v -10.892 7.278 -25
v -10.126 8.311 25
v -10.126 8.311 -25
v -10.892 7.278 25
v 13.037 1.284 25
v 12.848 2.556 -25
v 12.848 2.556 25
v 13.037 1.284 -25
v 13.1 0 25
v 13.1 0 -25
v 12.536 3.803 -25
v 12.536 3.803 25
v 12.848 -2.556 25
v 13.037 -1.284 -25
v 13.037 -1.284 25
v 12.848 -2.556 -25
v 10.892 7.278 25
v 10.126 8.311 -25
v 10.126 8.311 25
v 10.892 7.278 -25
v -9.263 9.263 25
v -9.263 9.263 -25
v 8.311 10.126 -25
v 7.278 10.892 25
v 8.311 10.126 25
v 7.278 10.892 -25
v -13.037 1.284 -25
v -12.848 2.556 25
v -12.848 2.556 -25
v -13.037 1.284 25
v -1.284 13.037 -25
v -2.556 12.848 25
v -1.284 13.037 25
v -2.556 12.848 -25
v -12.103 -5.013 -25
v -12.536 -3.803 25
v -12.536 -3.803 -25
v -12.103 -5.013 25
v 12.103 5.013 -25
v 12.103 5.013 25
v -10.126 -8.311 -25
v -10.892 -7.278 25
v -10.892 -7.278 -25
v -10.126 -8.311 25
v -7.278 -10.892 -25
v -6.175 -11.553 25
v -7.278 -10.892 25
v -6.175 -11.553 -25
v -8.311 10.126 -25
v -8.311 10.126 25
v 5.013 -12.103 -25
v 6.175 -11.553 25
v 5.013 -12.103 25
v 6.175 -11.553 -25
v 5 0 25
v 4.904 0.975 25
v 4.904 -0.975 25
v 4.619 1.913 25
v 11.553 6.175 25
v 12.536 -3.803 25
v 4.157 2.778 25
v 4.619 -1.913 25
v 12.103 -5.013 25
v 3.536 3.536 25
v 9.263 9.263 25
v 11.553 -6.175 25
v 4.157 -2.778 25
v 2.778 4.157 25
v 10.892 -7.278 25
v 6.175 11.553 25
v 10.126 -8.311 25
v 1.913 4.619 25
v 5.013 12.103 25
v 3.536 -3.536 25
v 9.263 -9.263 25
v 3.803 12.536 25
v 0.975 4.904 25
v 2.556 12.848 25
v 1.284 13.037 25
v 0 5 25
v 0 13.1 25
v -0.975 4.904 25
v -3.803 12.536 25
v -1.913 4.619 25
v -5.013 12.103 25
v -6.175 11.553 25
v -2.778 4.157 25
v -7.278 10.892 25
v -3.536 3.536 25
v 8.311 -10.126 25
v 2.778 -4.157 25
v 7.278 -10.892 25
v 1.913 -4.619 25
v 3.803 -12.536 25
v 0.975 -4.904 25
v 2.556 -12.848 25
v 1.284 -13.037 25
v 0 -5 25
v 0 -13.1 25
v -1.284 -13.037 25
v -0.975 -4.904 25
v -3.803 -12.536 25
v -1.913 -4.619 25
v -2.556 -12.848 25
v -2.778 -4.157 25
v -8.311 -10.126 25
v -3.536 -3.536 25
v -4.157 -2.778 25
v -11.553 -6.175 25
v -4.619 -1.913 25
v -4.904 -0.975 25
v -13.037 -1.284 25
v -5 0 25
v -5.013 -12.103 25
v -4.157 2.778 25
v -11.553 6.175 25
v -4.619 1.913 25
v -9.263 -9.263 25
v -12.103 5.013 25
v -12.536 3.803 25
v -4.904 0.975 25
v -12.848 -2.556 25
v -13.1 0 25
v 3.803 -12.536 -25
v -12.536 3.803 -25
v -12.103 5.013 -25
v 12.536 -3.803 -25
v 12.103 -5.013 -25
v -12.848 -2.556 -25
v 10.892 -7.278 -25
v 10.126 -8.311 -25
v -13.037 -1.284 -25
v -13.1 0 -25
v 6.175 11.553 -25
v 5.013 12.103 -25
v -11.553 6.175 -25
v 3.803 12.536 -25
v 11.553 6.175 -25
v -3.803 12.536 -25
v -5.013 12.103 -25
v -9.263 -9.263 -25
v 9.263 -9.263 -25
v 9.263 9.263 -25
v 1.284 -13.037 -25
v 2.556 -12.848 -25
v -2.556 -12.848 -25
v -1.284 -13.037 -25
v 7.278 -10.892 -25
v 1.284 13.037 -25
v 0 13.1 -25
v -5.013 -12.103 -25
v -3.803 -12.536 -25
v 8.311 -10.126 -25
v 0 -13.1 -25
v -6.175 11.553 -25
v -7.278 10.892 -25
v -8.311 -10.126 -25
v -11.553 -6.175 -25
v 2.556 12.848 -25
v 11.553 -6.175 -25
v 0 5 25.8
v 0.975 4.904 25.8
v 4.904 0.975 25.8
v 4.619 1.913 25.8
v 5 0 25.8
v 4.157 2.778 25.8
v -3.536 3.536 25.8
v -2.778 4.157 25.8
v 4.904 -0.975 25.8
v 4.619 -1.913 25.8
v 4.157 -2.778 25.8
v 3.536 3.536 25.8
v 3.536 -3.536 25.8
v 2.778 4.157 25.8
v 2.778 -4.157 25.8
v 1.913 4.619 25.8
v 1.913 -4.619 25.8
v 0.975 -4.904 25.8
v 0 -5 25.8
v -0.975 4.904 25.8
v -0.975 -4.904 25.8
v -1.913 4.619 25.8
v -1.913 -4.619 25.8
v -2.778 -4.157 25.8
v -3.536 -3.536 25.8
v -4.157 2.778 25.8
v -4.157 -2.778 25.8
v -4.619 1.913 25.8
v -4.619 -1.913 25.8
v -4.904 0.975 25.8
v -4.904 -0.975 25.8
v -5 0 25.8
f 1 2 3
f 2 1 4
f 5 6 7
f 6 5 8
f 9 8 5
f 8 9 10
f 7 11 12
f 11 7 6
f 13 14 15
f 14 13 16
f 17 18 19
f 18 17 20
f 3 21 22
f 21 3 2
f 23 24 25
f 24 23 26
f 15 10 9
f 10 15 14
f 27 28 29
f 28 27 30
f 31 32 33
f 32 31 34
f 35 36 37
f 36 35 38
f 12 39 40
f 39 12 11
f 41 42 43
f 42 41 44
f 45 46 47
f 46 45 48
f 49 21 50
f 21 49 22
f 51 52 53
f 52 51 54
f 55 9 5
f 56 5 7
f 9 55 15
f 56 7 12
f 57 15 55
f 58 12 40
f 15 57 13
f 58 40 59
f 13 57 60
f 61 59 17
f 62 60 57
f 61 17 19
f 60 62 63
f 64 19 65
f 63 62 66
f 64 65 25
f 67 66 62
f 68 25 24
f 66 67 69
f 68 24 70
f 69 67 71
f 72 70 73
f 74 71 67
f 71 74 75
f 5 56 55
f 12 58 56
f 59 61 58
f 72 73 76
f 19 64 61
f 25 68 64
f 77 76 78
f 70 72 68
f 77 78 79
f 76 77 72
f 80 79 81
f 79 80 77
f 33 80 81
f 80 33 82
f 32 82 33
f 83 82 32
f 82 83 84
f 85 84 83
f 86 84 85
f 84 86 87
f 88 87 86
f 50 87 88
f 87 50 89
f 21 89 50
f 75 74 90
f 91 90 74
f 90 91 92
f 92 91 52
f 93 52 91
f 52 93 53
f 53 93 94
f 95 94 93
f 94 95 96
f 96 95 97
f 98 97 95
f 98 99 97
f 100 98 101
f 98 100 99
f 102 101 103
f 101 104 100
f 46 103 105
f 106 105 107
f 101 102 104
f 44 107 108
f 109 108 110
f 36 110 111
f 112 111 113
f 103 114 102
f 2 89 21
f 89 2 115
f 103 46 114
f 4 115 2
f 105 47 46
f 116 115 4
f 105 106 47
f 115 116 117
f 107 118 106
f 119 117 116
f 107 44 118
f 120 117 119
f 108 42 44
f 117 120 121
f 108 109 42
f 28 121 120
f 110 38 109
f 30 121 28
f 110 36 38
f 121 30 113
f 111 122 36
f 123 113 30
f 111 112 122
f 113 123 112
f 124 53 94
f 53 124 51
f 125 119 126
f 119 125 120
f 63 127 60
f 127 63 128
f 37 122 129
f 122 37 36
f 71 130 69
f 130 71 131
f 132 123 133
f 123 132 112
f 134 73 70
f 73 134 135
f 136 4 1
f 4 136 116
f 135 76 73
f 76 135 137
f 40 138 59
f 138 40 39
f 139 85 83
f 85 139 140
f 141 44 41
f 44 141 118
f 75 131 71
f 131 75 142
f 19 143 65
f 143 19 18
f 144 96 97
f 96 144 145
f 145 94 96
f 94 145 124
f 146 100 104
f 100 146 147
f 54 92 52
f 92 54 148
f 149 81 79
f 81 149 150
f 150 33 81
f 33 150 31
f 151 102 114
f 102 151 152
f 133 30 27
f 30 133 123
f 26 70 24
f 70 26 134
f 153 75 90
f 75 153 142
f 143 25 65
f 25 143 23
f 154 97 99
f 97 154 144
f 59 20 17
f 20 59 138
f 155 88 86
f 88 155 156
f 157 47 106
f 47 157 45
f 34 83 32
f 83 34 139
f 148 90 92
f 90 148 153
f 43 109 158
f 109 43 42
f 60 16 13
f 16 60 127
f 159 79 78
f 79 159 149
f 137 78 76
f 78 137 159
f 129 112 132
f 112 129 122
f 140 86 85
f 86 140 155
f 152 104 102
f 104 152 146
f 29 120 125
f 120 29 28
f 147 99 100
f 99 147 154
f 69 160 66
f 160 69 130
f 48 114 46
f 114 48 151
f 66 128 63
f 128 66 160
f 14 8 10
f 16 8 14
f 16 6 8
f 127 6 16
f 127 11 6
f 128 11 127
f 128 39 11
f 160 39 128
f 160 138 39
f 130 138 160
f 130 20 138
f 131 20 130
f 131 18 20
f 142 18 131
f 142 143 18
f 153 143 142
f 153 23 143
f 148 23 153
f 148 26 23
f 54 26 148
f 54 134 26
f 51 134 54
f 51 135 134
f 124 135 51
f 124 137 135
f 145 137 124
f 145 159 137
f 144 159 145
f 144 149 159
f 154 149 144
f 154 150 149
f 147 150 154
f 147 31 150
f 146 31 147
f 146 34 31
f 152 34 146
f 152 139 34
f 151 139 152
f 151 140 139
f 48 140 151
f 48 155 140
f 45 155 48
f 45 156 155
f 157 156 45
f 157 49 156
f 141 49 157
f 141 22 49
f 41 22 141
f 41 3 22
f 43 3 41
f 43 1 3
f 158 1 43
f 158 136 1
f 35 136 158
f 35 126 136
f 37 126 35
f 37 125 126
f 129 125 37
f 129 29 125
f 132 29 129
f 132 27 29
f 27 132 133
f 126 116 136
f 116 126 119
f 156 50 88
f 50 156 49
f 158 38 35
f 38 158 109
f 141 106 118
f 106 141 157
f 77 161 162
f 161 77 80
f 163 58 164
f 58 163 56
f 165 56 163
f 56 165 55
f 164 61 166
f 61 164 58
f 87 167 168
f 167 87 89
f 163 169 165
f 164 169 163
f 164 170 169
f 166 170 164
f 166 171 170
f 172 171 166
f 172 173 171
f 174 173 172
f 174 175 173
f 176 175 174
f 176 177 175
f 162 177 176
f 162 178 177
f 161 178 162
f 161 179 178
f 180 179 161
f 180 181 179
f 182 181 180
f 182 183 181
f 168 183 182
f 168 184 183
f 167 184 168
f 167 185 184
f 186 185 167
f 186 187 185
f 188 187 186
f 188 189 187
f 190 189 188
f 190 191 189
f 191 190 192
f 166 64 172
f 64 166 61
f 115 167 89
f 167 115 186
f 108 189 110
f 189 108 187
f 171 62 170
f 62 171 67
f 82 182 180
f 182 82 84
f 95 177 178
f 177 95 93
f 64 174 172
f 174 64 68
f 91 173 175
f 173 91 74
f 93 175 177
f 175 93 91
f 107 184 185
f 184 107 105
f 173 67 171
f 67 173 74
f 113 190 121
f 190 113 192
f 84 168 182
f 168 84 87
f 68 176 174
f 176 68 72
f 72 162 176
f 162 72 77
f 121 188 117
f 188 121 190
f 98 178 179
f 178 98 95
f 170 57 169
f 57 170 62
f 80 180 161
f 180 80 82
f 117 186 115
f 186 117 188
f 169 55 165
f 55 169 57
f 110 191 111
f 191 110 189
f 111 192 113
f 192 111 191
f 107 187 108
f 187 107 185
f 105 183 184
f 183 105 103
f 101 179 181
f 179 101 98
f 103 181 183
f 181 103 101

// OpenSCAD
// Parameters
height_mm = 50.0; //[25.0:100.0:0.1]
diameter_mm = 26.2; //[13.1:52.4:0.1]
positive_terminal_diameter_mm = 10.0; //[5.0:20.0:0.1]
positive_terminal_height_mm = 1.6; //[0.8:3.2:0.1]
negative_terminal_diameter_mm = 18.0; //[9.0:26.2:0.1]
terminal_overlap_mm = 0.8; //[0.5:2.0:0.1]
negative_contact_thickness_mm = 0.6; //[0.3:1.5:0.1]

// Battery - complete geometry
module battery() {
  // Cell Body
  color([0.85, 0.85, 0.8]) { // Off-white for typical battery casing
    translate([0, 0, 0])
      cylinder(h=height_mm, r=diameter_mm/2, center=true, $fn=64);
  }
  
  // Positive Terminal
  color("Silver") { // Silver for metal contact
    translate([0, 0, height_mm/2 + positive_terminal_height_mm/2 - terminal_overlap_mm])
      cylinder(h=positive_terminal_height_mm, r=positive_terminal_diameter_mm/2, center=true, $fn=32);
  }
  
  // Negative Terminal
  color("Silver") { // Silver for metal contact
    translate([0, 0, -height_mm/2 - negative_contact_thickness_mm/2 + terminal_overlap_mm])
      cylinder(h=negative_contact_thickness_mm, r=negative_terminal_diameter_mm/2, center=true, $fn=32);
  }
}

// Assembly
module assembly() {
  battery();
}

assembly();
